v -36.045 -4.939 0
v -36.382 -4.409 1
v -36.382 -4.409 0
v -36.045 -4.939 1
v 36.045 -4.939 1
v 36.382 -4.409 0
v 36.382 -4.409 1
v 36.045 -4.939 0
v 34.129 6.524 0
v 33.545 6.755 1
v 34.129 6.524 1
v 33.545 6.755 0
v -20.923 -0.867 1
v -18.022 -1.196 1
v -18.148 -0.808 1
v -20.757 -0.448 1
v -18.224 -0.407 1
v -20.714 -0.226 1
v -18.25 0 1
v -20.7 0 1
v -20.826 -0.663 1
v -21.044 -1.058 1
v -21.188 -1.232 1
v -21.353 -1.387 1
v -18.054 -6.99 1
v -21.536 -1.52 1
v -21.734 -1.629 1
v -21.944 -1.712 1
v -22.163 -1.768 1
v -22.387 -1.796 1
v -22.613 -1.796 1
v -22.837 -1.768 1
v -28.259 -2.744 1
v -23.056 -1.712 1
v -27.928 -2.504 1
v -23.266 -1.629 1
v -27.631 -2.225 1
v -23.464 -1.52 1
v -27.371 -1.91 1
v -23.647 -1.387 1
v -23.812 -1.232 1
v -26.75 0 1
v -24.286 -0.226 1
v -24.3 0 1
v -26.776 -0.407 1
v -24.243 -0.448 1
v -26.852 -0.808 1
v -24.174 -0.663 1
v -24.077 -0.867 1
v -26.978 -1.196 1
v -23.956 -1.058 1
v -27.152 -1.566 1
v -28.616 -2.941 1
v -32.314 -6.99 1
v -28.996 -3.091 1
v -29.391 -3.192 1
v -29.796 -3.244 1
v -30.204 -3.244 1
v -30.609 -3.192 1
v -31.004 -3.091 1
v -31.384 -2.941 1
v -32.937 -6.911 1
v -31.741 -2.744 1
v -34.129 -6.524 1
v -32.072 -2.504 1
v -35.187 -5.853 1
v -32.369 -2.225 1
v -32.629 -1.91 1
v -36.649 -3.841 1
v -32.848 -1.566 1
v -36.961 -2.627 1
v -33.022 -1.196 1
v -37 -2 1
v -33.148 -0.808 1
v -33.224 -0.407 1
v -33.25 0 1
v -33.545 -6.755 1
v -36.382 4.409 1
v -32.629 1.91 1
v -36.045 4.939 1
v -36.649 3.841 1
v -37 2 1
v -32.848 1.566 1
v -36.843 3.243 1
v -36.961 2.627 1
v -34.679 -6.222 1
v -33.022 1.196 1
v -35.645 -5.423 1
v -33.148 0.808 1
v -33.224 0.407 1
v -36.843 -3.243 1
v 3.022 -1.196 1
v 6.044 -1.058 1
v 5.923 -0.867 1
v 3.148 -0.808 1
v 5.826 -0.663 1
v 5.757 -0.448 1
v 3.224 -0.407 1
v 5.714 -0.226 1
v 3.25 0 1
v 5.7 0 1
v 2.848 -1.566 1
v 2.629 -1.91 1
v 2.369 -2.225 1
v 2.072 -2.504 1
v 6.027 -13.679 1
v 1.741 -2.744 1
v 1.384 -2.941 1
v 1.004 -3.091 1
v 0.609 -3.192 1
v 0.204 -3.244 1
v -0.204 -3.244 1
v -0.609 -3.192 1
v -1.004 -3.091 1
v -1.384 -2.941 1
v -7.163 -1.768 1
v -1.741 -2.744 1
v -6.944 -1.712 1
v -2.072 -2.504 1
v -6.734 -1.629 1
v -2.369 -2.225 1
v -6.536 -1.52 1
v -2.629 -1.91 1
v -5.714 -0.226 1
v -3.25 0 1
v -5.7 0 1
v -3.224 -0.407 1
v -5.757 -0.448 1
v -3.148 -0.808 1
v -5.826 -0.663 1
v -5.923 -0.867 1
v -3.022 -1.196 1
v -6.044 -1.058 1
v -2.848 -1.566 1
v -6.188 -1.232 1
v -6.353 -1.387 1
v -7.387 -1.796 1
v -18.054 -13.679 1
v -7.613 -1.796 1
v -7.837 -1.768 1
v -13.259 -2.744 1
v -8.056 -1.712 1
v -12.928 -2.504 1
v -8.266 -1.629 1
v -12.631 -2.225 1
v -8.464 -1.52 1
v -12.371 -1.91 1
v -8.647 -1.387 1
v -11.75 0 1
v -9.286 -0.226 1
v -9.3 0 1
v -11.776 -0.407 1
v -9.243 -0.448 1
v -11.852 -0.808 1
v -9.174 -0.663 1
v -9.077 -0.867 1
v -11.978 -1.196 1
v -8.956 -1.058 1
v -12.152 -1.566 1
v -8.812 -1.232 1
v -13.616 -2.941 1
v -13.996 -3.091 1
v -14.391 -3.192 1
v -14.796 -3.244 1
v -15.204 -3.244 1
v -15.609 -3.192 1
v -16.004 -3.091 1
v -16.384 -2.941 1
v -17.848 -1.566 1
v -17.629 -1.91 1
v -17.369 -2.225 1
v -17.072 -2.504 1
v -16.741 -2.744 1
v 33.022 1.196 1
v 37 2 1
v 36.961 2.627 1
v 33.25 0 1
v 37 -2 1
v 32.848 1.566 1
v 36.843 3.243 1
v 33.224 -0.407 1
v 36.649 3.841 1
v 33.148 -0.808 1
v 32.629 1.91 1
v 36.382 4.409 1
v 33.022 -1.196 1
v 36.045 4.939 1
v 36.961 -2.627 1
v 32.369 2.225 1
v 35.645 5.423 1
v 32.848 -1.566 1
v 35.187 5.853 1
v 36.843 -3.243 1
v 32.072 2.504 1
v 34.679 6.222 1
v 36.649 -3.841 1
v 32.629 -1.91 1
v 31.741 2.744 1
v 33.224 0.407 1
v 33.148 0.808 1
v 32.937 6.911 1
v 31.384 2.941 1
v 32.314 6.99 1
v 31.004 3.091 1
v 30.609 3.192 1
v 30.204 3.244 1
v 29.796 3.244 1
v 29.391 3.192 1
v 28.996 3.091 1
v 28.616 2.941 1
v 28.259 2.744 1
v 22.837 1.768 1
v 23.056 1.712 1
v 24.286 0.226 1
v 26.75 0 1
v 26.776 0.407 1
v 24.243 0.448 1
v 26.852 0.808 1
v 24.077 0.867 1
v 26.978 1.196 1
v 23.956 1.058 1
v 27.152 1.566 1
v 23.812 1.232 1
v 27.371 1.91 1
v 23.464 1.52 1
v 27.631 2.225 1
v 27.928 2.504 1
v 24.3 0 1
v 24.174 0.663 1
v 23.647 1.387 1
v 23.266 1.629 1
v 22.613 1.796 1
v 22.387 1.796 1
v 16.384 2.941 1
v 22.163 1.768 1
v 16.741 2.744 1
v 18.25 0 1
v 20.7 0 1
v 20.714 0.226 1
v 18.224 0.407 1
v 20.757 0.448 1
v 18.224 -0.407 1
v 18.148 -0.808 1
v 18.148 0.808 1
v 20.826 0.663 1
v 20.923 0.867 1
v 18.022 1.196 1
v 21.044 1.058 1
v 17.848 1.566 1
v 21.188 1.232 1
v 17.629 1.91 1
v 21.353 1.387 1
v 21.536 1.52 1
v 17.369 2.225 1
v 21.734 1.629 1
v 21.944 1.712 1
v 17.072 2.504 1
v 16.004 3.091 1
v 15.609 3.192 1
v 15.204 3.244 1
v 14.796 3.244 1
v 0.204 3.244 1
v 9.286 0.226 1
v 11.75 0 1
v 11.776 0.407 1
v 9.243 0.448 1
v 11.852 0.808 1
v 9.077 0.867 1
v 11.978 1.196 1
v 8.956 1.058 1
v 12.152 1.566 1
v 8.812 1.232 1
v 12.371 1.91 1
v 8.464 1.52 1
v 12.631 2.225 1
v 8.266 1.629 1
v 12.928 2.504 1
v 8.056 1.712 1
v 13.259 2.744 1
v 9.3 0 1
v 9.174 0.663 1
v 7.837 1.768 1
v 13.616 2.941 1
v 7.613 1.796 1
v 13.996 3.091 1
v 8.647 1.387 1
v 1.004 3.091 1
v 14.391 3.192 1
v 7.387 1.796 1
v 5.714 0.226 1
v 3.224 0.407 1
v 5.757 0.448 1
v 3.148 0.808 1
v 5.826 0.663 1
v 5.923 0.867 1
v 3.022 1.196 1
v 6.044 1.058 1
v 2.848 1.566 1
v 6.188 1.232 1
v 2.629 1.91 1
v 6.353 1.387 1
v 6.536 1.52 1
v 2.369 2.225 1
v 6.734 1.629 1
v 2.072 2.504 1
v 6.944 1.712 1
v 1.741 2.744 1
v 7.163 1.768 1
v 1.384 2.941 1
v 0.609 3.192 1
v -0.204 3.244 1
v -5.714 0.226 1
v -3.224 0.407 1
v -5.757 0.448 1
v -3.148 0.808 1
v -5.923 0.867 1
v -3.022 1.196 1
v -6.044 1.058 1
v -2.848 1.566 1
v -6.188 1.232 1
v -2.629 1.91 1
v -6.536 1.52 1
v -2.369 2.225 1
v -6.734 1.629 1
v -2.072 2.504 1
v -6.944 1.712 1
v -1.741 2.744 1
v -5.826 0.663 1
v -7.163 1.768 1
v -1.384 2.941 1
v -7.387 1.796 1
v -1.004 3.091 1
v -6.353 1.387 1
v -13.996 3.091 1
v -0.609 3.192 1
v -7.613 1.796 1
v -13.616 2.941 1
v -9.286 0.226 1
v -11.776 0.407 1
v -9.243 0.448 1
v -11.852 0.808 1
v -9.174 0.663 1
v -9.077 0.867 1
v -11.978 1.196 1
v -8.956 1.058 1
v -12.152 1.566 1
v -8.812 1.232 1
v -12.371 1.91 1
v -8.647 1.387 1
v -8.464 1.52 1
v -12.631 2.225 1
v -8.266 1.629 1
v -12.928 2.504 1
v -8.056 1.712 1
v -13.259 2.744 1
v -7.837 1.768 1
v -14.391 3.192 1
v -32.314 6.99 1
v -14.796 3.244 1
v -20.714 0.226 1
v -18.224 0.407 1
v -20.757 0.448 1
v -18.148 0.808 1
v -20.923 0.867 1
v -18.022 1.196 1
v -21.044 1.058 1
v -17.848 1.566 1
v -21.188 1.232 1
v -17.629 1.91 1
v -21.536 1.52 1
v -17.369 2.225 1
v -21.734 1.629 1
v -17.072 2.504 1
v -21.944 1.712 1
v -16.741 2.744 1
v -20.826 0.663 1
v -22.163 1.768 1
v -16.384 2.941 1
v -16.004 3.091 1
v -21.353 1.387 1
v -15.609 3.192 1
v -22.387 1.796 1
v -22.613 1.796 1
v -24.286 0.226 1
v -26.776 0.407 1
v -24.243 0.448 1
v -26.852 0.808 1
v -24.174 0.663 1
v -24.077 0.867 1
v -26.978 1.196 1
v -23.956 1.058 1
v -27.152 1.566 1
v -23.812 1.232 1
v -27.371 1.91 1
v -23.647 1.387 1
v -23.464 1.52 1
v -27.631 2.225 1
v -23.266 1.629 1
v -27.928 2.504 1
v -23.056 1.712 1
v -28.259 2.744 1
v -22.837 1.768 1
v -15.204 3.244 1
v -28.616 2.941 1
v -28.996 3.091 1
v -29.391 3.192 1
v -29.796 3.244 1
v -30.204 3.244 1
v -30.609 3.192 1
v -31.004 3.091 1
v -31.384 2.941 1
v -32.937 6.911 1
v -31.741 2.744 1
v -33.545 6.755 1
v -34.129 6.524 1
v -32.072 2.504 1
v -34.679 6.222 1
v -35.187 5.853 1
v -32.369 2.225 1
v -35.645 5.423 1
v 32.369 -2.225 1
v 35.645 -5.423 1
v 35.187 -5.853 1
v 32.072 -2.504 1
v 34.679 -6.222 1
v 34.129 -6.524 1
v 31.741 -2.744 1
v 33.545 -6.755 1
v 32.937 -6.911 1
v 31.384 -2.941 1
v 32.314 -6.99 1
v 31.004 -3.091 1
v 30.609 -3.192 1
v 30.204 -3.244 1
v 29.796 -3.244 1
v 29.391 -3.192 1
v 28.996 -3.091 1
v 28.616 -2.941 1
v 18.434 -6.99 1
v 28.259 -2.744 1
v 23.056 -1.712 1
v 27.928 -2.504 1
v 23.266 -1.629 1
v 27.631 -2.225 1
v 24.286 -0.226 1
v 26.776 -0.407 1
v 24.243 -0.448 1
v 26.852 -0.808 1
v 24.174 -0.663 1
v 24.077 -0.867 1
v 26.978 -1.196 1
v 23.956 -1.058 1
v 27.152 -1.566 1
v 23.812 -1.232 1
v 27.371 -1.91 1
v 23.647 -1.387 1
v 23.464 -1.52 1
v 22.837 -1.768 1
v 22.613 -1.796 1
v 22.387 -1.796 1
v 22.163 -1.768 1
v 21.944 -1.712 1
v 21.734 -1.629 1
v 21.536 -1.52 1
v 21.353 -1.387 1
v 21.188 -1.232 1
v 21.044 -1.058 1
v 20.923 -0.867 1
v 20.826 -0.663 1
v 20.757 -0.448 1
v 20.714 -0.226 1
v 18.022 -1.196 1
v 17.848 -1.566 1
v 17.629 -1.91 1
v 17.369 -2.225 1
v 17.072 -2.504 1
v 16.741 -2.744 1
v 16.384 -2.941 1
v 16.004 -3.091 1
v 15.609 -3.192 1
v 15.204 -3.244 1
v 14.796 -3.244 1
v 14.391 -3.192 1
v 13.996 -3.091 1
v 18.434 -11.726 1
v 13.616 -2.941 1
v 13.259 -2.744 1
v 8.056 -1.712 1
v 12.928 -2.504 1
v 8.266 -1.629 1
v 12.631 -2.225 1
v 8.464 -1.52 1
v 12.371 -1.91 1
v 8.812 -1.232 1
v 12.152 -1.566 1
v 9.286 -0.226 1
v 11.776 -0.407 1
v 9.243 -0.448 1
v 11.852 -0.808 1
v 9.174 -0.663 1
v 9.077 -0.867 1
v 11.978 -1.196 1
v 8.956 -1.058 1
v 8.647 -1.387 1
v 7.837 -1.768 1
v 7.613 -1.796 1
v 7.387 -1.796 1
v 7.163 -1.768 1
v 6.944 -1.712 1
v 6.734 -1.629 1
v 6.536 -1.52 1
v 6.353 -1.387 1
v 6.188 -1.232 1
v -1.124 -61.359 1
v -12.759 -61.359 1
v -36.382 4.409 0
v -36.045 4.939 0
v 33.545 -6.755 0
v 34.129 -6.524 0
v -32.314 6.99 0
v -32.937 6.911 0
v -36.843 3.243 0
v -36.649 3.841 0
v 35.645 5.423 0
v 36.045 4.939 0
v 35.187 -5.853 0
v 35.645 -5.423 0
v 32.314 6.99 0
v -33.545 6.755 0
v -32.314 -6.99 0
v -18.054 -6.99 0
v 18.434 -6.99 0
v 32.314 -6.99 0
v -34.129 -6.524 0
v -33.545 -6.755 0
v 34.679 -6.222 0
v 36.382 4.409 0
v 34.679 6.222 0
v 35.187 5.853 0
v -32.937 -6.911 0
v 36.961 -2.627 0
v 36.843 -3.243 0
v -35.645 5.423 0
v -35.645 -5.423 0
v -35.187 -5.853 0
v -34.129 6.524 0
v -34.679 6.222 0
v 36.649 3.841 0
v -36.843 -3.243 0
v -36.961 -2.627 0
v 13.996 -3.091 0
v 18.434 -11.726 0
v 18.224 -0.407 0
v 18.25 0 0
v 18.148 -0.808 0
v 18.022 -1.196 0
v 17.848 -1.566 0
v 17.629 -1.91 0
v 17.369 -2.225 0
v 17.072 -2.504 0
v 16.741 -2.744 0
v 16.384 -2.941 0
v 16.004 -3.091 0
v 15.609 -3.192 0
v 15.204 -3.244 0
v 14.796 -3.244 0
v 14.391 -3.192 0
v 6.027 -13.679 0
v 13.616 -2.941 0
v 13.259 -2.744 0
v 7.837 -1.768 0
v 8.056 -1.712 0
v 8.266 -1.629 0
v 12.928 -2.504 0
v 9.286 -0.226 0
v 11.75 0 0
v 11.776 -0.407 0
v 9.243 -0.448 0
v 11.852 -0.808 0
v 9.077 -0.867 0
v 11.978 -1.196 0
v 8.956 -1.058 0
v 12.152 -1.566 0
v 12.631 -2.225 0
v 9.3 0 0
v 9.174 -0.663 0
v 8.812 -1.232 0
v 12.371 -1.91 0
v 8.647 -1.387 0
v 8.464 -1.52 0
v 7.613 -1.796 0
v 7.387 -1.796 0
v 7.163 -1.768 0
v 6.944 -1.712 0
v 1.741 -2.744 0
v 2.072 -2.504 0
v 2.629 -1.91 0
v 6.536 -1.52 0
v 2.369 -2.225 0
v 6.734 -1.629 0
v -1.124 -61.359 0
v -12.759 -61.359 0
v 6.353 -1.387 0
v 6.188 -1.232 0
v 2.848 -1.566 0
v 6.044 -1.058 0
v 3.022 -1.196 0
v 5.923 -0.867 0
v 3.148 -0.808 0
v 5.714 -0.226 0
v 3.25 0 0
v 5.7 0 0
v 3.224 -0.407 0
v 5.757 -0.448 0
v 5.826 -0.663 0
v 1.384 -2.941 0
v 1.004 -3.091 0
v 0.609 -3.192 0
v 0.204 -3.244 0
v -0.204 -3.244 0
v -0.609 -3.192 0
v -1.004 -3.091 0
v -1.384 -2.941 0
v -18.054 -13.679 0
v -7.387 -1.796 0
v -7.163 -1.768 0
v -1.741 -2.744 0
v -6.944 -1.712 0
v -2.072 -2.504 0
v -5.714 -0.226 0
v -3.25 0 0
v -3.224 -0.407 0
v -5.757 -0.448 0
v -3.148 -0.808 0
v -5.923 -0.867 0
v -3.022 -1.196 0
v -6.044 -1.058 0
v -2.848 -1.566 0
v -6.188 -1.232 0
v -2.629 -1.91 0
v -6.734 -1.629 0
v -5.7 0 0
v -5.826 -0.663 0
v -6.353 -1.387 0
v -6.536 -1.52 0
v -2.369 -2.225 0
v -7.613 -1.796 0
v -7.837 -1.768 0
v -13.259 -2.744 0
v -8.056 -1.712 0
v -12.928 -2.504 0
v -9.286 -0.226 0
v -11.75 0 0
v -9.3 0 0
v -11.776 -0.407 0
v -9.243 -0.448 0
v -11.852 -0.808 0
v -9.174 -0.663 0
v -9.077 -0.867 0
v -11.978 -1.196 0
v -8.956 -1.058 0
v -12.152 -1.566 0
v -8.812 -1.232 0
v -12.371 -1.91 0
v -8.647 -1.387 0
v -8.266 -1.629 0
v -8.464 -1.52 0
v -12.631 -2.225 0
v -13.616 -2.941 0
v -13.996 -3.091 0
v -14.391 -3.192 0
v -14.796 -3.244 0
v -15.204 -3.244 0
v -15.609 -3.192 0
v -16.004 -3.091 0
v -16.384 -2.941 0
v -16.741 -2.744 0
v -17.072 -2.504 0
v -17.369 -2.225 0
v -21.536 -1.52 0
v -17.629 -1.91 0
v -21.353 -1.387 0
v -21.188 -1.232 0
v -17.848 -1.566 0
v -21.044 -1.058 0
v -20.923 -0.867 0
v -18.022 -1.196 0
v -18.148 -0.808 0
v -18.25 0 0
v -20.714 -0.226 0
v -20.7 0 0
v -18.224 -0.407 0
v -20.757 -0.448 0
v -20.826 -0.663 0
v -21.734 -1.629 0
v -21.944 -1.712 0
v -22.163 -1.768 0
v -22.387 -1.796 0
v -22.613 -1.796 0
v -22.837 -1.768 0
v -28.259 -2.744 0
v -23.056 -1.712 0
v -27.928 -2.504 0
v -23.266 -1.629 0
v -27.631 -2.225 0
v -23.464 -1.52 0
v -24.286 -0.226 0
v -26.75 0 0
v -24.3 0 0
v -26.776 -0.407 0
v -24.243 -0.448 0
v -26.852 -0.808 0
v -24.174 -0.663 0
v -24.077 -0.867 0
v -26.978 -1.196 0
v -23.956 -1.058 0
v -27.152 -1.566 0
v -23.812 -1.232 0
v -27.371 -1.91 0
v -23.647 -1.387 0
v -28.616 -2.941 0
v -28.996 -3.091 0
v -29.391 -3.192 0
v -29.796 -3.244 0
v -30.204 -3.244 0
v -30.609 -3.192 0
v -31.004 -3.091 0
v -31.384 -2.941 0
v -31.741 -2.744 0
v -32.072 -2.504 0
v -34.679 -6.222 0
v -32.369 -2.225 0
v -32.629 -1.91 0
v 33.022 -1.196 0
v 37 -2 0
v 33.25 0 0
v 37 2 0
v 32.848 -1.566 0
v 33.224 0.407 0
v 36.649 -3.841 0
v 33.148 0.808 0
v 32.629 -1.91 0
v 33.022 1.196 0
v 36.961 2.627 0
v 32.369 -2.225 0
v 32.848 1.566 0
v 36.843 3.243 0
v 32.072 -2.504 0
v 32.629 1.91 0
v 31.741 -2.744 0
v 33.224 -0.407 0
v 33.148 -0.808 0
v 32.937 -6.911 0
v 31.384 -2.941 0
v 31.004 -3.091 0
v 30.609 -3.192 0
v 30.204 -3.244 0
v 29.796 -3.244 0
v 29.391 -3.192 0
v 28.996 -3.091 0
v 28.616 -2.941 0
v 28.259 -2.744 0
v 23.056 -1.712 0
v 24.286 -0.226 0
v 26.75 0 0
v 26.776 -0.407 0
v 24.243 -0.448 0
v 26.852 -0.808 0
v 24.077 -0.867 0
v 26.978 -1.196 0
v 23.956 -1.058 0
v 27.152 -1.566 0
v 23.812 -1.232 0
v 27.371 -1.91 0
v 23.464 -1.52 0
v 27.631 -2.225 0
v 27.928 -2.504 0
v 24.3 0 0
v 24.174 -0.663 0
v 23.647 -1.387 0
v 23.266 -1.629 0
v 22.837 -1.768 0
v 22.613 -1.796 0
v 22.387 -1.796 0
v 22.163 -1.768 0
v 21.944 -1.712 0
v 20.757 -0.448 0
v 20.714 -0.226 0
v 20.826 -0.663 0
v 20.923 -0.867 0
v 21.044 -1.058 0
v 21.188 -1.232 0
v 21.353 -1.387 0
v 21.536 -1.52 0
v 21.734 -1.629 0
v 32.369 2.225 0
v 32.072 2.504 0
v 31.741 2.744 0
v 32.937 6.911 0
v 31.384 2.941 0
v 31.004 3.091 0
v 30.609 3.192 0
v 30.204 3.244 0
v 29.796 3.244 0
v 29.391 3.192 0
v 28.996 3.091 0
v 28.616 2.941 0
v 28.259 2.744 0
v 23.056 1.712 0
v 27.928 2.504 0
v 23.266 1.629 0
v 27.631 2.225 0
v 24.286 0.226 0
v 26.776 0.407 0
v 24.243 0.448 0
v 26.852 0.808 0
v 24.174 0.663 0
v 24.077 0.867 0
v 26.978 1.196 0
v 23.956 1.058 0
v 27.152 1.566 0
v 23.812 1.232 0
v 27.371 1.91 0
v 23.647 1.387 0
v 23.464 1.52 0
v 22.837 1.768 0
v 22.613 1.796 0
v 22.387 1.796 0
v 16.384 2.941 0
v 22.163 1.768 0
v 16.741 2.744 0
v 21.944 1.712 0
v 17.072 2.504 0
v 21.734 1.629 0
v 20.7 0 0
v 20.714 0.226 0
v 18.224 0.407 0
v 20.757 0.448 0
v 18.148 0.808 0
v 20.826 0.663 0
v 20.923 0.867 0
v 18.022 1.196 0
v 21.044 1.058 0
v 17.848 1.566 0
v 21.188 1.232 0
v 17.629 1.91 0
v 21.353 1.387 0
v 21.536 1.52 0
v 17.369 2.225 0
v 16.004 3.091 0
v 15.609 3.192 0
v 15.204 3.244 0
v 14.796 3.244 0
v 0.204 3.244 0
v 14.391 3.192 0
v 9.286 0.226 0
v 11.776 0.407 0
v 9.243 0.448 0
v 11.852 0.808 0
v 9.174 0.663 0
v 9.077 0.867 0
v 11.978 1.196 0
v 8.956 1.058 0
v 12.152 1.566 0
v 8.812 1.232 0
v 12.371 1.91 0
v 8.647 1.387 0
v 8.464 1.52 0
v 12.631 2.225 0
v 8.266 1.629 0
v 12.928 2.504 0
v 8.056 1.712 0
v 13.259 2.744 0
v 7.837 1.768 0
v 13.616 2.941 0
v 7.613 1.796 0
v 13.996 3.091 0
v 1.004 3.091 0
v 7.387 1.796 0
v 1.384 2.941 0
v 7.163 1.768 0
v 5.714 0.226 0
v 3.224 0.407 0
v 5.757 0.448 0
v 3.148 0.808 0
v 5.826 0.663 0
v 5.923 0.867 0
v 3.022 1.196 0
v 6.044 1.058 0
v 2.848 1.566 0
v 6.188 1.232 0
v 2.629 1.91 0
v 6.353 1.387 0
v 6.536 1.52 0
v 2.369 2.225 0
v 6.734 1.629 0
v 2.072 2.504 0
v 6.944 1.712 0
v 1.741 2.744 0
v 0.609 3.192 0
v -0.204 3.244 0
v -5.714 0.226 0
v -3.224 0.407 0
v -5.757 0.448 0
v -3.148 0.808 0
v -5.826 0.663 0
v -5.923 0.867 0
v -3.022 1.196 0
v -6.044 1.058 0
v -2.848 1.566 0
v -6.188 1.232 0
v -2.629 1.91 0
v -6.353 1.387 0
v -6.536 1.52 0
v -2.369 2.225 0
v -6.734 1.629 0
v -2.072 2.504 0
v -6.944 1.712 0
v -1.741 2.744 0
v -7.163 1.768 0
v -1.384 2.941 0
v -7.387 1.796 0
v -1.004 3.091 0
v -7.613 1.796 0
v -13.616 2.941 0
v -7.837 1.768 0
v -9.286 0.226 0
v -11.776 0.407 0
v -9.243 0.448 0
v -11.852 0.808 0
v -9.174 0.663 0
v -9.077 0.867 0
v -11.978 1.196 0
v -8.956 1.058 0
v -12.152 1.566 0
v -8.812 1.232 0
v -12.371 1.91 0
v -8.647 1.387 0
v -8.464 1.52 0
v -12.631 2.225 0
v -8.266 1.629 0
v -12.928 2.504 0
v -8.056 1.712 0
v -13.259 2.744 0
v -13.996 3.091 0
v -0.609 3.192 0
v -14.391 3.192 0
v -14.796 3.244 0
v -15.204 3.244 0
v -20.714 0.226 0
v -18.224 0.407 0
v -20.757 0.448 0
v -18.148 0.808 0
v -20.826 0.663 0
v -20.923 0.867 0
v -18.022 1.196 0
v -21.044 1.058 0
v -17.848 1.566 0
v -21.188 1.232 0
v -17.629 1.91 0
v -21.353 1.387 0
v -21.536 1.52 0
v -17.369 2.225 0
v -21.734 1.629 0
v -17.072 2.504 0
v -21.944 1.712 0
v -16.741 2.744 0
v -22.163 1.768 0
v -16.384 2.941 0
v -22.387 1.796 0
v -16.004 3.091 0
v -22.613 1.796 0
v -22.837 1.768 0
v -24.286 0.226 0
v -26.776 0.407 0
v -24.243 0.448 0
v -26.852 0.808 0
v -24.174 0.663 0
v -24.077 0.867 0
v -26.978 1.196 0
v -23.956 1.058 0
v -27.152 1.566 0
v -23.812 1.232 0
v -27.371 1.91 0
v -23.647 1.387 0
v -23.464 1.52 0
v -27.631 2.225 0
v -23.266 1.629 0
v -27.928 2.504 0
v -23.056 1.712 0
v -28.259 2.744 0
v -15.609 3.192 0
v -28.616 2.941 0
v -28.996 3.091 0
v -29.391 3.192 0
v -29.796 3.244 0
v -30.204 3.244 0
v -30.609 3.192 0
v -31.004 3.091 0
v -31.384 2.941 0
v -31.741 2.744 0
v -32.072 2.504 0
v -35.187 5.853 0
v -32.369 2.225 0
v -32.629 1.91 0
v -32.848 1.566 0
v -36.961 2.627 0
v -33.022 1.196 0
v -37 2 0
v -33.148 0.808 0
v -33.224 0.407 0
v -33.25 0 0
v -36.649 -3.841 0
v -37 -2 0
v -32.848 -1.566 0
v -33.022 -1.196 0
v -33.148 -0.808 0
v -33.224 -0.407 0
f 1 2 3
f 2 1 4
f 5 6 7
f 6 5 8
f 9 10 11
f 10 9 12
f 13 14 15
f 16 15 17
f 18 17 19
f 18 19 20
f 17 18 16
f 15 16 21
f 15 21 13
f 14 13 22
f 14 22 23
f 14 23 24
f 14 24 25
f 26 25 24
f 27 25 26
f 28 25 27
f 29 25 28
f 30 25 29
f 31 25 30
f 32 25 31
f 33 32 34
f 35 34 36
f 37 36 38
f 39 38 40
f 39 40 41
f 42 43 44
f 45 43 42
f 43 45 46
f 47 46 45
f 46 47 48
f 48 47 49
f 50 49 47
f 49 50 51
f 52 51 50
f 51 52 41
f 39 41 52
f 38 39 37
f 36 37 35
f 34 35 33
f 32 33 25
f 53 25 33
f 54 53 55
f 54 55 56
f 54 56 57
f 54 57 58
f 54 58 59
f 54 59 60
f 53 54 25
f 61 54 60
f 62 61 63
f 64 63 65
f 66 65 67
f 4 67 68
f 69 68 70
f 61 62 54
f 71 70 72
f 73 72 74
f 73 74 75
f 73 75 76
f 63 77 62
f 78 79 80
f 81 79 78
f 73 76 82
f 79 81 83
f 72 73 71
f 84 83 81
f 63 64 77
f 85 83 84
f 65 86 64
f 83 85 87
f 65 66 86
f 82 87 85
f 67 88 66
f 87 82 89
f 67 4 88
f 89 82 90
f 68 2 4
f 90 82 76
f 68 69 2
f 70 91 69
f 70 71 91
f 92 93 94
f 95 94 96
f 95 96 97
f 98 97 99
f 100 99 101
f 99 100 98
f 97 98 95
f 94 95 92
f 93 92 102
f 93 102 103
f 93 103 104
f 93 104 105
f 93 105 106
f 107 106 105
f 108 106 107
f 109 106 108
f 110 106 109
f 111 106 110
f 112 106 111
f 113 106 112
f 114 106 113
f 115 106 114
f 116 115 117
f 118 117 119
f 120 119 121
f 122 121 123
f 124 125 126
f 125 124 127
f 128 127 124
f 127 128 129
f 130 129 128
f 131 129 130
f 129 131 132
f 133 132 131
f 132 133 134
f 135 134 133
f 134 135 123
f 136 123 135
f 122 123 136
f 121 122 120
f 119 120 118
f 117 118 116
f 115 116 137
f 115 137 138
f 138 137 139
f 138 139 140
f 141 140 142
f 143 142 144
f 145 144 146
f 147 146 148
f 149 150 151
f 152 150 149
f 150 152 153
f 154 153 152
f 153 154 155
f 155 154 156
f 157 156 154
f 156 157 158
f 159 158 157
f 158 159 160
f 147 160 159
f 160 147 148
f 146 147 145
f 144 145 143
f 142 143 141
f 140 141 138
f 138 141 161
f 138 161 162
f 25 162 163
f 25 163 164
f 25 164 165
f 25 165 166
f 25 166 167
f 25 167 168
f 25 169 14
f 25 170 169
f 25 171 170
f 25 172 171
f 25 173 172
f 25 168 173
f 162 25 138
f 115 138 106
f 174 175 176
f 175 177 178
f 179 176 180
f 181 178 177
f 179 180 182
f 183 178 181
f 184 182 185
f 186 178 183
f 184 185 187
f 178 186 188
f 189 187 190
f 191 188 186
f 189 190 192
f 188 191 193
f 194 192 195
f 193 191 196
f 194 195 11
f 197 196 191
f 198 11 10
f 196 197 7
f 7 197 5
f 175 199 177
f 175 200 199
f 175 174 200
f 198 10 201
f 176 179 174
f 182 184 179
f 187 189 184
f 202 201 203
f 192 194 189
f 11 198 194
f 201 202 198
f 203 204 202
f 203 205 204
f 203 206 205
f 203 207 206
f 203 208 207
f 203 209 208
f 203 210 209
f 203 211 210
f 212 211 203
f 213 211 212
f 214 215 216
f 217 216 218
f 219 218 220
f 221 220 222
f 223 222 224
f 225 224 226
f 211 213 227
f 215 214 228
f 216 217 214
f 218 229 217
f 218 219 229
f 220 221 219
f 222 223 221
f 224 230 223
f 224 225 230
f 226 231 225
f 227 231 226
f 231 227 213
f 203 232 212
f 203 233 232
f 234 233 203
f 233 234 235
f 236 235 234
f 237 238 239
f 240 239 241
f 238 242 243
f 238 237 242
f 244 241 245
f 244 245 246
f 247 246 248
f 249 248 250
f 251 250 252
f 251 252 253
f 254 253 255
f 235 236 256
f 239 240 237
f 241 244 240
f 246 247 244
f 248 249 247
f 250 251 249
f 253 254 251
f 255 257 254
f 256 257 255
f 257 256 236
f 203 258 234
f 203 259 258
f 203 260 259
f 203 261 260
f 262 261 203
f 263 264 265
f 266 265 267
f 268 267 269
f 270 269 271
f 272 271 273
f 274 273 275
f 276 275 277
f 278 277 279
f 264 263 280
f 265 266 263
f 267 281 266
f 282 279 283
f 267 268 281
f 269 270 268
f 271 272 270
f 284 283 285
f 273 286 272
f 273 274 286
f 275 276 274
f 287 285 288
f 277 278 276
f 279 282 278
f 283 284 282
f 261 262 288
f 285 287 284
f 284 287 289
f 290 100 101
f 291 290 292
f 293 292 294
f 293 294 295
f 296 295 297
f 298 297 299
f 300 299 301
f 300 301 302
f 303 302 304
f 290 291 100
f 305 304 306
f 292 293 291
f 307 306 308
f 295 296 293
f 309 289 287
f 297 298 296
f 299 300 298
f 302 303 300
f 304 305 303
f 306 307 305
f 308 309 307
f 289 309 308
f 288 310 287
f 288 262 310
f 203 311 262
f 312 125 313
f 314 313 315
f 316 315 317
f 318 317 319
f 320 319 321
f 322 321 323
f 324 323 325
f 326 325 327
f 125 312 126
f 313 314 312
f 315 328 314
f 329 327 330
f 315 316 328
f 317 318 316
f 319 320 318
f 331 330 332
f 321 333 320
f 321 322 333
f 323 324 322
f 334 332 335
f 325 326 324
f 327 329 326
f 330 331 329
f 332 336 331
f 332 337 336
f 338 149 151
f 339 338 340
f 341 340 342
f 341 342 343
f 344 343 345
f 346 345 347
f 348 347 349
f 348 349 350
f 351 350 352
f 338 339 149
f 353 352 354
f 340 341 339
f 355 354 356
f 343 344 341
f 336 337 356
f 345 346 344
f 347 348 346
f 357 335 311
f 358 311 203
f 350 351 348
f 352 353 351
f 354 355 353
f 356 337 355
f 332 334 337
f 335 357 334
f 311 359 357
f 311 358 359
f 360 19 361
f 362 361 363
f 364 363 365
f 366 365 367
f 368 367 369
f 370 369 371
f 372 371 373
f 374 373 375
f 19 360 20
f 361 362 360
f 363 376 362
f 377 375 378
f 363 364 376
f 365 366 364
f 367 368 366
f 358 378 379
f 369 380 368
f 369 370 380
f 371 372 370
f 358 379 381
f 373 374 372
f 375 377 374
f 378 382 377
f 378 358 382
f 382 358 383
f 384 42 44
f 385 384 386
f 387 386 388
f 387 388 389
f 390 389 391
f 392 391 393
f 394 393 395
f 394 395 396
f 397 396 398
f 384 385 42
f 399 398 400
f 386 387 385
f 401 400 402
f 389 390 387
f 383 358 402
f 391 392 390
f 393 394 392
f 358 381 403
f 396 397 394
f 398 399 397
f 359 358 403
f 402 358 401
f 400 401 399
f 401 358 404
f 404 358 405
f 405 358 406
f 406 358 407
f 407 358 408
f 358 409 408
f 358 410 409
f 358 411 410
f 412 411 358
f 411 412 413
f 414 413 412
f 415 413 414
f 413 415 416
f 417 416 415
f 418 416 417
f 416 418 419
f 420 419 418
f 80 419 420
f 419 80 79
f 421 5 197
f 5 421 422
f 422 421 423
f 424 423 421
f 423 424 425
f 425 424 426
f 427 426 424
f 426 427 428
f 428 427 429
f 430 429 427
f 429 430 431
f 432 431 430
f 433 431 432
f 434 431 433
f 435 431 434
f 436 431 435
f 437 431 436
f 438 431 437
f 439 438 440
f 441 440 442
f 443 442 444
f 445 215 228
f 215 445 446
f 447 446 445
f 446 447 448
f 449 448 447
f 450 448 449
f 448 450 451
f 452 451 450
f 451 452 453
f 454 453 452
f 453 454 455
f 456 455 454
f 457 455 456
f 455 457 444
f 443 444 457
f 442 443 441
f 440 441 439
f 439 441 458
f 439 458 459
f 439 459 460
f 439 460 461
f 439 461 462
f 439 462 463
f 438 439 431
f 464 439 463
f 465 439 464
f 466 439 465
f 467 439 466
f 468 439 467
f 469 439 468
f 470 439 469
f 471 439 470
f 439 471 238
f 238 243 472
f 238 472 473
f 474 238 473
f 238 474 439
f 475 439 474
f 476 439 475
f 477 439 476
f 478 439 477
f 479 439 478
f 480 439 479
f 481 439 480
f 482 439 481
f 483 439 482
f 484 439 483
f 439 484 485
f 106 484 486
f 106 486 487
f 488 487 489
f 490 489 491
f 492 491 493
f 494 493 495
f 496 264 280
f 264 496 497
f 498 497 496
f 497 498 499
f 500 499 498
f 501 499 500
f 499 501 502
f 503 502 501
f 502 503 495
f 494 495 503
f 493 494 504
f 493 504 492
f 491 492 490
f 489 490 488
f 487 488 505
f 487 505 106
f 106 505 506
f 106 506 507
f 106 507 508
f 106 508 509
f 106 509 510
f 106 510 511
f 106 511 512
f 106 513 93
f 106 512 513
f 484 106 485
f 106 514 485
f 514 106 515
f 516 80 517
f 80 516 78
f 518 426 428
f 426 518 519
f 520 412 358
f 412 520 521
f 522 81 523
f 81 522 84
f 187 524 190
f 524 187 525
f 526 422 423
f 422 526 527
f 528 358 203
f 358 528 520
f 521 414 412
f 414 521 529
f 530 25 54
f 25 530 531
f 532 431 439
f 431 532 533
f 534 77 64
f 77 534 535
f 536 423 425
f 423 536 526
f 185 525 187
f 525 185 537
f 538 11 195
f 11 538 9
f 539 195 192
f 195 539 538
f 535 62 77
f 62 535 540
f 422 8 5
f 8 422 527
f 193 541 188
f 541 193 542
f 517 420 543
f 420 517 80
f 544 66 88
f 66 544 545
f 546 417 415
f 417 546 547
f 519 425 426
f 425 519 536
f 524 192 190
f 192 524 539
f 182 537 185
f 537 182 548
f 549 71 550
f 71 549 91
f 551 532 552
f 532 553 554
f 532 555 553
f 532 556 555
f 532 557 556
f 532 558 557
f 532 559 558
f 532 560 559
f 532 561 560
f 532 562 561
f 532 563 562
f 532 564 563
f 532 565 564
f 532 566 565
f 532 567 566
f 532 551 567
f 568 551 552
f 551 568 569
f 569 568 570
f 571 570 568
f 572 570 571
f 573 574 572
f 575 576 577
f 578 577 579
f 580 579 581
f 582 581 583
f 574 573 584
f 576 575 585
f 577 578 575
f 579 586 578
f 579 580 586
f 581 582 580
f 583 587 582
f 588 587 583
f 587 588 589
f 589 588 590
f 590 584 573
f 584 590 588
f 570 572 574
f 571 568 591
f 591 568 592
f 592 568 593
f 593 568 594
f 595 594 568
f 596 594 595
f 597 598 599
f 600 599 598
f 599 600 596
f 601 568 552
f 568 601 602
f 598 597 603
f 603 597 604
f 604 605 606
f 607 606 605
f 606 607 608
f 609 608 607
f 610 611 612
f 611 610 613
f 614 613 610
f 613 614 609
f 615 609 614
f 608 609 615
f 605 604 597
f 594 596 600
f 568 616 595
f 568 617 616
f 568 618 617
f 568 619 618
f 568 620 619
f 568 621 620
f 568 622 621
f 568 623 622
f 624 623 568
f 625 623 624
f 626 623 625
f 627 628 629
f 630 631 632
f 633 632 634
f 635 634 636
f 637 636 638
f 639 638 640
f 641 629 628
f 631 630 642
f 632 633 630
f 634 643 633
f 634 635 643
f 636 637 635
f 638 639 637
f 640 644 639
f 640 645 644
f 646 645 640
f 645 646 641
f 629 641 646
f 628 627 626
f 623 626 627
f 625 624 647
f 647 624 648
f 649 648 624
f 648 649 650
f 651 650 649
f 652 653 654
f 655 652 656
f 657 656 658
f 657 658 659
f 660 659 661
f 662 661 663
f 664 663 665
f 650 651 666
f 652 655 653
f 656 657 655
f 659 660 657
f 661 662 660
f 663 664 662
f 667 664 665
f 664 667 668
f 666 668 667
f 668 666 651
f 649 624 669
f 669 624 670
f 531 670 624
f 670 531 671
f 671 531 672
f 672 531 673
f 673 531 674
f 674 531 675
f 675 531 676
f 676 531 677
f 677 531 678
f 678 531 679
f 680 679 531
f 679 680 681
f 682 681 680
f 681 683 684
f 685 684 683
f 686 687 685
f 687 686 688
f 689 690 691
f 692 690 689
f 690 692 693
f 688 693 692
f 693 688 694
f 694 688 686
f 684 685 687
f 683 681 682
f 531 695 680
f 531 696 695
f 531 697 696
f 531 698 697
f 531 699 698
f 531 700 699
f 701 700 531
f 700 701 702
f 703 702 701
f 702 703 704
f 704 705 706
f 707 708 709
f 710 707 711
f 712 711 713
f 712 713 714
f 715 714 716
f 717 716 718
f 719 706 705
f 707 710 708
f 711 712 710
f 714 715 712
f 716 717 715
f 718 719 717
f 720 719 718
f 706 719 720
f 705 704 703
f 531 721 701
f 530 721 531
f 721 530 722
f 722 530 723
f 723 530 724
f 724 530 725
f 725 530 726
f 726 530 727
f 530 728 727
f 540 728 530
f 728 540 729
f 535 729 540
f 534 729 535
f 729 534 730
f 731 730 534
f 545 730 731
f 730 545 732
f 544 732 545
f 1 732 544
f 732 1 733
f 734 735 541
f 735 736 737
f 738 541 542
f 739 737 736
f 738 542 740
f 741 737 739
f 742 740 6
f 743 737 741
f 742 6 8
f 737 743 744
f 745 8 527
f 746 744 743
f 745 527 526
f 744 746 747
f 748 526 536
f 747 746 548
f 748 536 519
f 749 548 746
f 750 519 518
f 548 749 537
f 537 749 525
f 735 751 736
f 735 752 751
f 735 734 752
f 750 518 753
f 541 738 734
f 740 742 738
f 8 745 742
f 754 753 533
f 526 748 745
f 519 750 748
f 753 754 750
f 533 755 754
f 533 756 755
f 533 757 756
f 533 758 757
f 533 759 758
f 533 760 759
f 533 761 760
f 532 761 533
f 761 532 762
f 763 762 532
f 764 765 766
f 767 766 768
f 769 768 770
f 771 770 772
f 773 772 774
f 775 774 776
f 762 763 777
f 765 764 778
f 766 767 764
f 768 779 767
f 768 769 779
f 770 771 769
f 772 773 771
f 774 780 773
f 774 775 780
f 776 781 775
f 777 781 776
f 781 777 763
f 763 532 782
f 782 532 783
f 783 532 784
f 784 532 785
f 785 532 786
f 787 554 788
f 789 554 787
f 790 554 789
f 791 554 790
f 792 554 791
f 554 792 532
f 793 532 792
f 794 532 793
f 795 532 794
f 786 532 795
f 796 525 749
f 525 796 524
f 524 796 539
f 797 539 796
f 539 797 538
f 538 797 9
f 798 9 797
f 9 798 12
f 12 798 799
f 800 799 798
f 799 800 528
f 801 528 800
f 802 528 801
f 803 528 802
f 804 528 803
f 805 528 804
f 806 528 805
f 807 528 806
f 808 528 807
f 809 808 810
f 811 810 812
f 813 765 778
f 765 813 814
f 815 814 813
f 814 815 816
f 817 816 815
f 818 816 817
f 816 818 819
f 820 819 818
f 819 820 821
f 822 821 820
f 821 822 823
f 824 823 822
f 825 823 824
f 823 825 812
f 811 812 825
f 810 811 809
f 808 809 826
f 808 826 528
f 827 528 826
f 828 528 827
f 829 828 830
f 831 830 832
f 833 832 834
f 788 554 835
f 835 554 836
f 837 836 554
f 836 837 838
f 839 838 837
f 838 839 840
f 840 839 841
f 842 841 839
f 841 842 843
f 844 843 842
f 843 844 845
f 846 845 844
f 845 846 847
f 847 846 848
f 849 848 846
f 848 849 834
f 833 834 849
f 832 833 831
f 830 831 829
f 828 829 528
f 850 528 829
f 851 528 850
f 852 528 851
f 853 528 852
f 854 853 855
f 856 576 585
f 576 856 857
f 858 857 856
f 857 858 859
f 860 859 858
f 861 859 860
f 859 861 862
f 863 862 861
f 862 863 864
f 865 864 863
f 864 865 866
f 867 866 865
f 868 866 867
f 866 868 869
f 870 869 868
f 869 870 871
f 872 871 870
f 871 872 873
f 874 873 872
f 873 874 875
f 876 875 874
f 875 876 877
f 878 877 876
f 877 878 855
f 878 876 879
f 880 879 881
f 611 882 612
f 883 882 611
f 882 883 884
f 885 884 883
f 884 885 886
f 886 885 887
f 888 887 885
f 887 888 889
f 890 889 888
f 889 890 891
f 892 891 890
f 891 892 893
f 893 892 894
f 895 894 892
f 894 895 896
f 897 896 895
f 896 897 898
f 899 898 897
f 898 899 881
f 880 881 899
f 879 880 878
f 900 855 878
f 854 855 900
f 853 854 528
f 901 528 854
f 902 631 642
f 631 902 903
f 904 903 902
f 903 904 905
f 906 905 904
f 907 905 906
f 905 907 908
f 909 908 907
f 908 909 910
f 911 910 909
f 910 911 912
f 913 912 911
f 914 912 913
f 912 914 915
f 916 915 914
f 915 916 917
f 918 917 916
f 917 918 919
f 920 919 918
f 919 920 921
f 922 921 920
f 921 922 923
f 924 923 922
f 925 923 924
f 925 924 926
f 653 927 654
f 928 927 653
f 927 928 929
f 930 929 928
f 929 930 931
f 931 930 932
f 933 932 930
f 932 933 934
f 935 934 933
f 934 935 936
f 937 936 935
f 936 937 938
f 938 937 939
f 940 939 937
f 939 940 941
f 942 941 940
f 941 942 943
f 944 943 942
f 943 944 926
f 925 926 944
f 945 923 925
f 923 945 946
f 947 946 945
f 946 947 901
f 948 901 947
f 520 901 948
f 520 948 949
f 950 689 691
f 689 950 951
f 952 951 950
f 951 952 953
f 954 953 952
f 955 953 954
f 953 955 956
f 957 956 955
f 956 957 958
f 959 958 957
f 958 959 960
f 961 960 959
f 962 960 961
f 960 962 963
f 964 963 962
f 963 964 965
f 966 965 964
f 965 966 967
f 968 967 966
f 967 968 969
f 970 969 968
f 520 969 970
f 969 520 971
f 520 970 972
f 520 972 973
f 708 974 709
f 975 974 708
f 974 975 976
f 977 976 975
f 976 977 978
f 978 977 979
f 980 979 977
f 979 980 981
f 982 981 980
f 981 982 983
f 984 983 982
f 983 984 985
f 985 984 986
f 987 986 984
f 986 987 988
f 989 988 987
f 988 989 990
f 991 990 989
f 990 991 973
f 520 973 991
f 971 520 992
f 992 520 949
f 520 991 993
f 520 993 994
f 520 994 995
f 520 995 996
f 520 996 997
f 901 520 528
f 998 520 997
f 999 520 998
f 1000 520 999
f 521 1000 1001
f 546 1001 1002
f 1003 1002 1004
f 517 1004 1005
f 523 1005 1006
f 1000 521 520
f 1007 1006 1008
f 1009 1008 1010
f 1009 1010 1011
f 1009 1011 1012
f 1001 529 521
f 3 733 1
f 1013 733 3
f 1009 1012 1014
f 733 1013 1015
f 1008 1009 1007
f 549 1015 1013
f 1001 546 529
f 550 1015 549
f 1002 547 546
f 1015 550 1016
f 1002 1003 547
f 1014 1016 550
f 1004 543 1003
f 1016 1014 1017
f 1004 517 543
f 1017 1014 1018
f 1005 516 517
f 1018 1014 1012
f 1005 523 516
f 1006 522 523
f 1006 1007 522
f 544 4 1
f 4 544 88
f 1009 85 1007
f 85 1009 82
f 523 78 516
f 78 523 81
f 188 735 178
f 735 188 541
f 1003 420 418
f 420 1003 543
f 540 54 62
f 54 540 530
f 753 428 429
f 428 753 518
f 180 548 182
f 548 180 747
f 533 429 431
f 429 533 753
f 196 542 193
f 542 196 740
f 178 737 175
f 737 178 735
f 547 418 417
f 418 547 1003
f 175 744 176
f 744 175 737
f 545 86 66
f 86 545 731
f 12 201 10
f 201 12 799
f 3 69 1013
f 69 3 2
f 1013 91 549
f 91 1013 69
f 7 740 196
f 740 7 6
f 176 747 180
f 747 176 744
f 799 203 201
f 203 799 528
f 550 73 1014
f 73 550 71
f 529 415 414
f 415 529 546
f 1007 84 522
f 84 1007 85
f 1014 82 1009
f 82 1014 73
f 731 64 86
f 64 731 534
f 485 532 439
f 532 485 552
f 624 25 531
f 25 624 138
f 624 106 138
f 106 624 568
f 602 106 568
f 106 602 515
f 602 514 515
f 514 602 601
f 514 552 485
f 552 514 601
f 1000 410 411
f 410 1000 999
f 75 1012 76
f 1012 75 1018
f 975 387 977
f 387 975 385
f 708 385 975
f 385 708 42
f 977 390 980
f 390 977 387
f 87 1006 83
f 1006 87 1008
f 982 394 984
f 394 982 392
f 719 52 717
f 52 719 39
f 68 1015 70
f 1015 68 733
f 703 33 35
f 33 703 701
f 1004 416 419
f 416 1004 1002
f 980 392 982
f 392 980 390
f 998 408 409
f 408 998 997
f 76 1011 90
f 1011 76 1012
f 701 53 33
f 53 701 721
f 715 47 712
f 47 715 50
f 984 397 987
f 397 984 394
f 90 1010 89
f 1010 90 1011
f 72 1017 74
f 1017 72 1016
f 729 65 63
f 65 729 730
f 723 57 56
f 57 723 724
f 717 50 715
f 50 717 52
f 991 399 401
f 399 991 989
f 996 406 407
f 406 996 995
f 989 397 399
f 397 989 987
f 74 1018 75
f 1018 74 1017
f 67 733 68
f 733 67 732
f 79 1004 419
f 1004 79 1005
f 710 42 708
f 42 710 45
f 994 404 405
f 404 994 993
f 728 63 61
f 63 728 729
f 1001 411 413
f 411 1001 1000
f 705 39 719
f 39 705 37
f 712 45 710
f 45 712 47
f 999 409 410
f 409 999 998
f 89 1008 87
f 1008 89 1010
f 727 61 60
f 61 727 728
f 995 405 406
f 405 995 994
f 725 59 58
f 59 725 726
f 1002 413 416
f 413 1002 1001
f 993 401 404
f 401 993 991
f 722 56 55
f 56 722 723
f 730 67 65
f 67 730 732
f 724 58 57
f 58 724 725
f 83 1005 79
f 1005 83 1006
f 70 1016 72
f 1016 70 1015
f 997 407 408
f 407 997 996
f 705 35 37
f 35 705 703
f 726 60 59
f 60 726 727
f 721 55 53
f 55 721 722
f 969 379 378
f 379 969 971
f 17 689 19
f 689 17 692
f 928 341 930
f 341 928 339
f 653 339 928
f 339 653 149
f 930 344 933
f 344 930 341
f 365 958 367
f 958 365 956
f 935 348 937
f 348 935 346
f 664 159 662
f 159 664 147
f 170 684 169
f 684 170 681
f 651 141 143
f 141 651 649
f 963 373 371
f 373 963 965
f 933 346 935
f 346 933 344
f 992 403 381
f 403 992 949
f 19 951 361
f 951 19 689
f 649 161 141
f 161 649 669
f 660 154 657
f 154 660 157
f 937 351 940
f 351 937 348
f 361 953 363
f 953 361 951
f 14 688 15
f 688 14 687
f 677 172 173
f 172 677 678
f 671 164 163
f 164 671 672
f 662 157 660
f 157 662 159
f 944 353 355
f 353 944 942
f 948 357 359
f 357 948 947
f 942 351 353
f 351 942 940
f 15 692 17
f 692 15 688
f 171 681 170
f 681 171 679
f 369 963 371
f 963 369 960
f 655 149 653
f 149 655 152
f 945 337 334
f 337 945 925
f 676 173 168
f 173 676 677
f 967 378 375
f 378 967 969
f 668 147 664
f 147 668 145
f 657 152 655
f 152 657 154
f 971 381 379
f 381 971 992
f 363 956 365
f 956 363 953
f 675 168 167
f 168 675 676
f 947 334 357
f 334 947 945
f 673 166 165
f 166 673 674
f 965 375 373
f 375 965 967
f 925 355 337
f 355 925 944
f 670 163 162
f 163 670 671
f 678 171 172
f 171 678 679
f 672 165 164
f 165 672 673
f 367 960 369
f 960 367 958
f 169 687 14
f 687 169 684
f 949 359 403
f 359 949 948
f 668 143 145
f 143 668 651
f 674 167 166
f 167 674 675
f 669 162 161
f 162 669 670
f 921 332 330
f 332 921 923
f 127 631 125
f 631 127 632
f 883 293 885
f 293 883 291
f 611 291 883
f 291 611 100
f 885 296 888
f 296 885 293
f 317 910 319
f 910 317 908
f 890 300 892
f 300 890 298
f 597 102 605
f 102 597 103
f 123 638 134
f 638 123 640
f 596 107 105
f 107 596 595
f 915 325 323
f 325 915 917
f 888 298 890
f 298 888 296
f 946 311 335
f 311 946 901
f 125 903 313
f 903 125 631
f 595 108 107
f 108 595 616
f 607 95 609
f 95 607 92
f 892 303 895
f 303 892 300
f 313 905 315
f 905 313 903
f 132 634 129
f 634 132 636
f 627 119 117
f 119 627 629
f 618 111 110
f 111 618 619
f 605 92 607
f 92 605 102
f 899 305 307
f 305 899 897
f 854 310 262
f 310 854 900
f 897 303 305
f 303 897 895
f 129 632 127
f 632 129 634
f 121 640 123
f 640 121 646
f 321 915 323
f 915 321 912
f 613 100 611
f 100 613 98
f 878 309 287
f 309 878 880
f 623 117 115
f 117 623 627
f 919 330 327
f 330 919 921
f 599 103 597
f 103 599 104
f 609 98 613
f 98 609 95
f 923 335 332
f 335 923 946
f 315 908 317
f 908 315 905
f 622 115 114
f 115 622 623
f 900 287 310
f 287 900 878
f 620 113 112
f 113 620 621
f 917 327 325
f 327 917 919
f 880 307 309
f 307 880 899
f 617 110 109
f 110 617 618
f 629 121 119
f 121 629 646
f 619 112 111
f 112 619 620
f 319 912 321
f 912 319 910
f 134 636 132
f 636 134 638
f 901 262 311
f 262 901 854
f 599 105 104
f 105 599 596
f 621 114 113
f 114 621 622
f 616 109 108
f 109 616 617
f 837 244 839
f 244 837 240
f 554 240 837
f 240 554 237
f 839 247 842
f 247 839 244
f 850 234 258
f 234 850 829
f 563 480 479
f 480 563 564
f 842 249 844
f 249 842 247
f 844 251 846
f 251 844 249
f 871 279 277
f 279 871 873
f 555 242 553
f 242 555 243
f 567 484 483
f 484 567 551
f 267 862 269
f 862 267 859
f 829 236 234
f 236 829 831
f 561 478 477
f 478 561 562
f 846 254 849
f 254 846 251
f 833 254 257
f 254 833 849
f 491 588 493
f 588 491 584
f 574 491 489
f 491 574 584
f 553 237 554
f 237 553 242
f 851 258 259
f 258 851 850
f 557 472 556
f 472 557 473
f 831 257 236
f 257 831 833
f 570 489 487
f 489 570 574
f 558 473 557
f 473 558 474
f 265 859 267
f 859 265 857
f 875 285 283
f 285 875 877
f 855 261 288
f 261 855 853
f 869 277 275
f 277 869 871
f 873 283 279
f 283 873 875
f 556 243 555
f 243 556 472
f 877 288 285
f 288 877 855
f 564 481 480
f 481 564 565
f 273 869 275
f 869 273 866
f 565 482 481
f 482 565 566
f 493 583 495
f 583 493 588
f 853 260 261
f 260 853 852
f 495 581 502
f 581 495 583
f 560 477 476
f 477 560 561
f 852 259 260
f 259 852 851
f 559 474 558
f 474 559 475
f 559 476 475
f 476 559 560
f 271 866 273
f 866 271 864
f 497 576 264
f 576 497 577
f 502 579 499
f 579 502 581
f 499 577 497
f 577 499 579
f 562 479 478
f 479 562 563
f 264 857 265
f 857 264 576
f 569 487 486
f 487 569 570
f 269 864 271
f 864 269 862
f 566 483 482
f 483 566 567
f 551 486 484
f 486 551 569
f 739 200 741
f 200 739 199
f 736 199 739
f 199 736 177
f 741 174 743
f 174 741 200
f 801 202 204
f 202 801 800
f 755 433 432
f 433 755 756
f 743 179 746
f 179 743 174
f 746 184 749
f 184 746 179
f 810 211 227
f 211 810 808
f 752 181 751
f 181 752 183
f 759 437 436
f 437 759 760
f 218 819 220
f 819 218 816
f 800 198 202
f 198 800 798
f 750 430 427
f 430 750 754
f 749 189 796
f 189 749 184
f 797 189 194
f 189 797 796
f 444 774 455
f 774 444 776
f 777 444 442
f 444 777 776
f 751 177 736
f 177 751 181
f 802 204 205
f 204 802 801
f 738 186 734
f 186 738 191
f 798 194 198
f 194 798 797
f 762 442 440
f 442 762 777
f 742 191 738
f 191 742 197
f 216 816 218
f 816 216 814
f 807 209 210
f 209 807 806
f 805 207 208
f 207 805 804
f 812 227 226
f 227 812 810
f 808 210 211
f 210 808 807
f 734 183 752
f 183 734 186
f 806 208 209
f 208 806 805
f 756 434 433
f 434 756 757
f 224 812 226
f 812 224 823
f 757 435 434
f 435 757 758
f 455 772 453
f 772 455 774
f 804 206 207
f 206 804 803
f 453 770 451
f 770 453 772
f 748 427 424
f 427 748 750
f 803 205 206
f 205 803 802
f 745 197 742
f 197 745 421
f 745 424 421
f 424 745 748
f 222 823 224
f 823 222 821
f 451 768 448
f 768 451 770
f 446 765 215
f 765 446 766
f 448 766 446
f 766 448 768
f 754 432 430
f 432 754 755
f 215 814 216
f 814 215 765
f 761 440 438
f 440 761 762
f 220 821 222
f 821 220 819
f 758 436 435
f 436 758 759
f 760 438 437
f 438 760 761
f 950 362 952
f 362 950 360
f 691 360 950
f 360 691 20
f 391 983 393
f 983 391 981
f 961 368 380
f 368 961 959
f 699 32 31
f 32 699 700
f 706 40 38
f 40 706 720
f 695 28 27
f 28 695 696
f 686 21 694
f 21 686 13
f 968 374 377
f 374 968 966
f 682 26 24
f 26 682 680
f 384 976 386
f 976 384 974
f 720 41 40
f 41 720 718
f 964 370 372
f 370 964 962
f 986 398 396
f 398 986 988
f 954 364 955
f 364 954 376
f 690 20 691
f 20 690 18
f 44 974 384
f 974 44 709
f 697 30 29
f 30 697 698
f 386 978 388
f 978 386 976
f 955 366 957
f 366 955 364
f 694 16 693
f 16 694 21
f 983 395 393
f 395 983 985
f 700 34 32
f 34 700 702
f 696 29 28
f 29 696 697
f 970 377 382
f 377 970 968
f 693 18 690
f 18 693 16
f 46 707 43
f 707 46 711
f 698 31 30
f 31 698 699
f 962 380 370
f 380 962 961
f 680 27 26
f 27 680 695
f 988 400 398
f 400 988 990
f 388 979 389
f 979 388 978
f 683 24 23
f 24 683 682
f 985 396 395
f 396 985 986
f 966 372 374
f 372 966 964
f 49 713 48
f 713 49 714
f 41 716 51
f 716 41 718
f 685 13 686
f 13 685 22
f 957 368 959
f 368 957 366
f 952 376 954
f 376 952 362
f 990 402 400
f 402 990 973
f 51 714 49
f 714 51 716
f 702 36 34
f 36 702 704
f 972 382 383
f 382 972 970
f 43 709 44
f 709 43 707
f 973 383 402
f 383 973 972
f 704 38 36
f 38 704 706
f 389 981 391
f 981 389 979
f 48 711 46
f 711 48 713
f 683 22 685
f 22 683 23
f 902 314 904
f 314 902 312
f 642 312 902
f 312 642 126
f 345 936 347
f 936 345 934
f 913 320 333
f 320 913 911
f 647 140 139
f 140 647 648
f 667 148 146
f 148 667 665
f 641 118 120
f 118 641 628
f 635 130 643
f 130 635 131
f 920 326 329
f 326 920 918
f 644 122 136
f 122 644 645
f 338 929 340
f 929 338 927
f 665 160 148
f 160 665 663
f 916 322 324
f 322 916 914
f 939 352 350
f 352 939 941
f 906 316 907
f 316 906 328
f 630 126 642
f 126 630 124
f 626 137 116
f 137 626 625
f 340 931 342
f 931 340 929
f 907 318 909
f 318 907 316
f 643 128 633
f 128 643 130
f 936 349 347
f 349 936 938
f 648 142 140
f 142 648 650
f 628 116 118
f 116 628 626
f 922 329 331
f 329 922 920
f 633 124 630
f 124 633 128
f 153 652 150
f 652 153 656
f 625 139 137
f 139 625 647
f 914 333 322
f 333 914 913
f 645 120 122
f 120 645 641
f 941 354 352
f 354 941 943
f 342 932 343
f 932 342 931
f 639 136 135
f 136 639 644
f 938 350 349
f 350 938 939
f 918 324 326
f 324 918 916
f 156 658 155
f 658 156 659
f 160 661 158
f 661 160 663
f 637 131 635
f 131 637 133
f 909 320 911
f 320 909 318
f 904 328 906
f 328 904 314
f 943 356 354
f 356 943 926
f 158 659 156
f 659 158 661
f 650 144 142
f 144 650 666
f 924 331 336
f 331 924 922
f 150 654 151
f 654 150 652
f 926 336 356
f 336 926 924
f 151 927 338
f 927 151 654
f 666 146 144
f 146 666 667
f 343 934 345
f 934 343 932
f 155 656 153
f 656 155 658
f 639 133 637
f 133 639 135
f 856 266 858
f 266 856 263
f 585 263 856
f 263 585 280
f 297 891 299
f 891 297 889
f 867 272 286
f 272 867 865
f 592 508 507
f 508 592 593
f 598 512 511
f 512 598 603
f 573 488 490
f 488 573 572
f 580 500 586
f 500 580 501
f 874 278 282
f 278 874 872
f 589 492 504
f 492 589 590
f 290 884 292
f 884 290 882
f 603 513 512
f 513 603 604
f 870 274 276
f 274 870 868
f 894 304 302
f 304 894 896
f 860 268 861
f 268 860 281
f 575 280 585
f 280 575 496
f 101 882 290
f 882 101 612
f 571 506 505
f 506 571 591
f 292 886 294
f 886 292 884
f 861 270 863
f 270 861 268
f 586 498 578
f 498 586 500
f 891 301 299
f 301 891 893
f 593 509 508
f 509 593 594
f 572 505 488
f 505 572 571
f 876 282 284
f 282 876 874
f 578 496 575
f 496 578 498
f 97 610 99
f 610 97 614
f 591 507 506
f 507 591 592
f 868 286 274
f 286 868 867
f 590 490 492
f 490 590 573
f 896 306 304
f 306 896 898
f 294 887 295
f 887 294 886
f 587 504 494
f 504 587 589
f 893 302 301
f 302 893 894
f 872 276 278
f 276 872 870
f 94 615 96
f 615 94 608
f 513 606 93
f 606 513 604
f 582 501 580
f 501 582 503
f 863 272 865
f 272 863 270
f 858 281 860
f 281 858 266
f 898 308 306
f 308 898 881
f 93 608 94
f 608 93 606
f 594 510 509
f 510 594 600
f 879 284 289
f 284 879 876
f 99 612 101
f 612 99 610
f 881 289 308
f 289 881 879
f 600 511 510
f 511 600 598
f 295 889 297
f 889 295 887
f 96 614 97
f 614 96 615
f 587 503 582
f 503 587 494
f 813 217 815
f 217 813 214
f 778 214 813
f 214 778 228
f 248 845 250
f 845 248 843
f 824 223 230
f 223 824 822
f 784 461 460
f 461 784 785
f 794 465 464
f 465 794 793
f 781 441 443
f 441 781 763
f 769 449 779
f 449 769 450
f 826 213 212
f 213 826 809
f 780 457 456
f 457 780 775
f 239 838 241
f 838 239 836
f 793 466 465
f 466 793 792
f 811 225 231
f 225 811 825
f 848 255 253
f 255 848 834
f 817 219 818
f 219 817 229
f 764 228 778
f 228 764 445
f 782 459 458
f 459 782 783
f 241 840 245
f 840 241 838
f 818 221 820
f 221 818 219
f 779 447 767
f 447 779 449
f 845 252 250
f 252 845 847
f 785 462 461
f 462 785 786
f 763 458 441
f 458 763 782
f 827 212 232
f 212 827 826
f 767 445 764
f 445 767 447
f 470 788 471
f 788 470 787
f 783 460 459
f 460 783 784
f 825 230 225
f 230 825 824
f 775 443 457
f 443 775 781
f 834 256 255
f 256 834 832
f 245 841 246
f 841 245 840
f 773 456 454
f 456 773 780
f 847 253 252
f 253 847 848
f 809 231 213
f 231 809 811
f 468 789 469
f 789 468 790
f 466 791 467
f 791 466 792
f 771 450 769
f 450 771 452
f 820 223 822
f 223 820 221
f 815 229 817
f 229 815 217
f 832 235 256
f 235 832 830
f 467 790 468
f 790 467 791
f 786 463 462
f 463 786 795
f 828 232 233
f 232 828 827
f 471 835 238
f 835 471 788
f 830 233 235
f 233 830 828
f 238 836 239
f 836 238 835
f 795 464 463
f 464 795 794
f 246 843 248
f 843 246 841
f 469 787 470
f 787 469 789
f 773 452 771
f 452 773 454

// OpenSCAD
$fn = 50;


difference() {
	union() {
		hull() {
			translate(v = [-32.0000000000, 2.0000000000, 0]) {
				cylinder(h = 1, r = 5);
			}
			translate(v = [32.0000000000, 2.0000000000, 0]) {
				cylinder(h = 1, r = 5);
			}
			translate(v = [-32.0000000000, -2.0000000000, 0]) {
				cylinder(h = 1, r = 5);
			}
			translate(v = [32.0000000000, -2.0000000000, 0]) {
				cylinder(h = 1, r = 5);
			}
		}
		translate(v = [0, -5, 0]) {
			linear_extrude(height = 1) {
				text(font = "DejaVu Sans Mono:style=Bold", halign = "center", size = 57.0000000000, text = "7", valign = "top");
			}
		}
	}
	union() {
		translate(v = [-30.0000000000, 0.0000000000, 0]) {
			translate(v = [0, 0, -100]) {
				cylinder(h = 200, r = 3.2500000000);
			}
		}
		translate(v = [-15.0000000000, 0.0000000000, 0]) {
			translate(v = [0, 0, -100]) {
				cylinder(h = 200, r = 3.2500000000);
			}
		}
		translate(v = [0, 0, -100]) {
			cylinder(h = 200, r = 3.2500000000);
		}
		translate(v = [15.0000000000, 0.0000000000, 0]) {
			translate(v = [0, 0, -100]) {
				cylinder(h = 200, r = 3.2500000000);
			}
		}
		translate(v = [30.0000000000, 0.0000000000, 0]) {
			translate(v = [0, 0, -100]) {
				cylinder(h = 200, r = 3.2500000000);
			}
		}
		translate(v = [-30.0000000000, 0.0000000000, 0]) {
			translate(v = [0, 0, -100]) {
				cylinder(h = 200, r = 1.8000000000);
			}
		}
		translate(v = [-22.5000000000, 0.0000000000, 0]) {
			translate(v = [0, 0, -100]) {
				cylinder(h = 200, r = 1.8000000000);
			}
		}
		translate(v = [-15.0000000000, 0.0000000000, 0]) {
			translate(v = [0, 0, -100]) {
				cylinder(h = 200, r = 1.8000000000);
			}
		}
		translate(v = [-7.5000000000, 0.0000000000, 0]) {
			translate(v = [0, 0, -100]) {
				cylinder(h = 200, r = 1.8000000000);
			}
		}
		translate(v = [0, 0, -100]) {
			cylinder(h = 200, r = 1.8000000000);
		}
		translate(v = [7.5000000000, 0.0000000000, 0]) {
			translate(v = [0, 0, -100]) {
				cylinder(h = 200, r = 1.8000000000);
			}
		}
		translate(v = [15.0000000000, 0.0000000000, 0]) {
			translate(v = [0, 0, -100]) {
				cylinder(h = 200, r = 1.8000000000);
			}
		}
		translate(v = [22.5000000000, 0.0000000000, 0]) {
			translate(v = [0, 0, -100]) {
				cylinder(h = 200, r = 1.8000000000);
			}
		}
		translate(v = [30.0000000000, 0.0000000000, 0]) {
			translate(v = [0, 0, -100]) {
				cylinder(h = 200, r = 1.8000000000);
			}
		}
	}
}
